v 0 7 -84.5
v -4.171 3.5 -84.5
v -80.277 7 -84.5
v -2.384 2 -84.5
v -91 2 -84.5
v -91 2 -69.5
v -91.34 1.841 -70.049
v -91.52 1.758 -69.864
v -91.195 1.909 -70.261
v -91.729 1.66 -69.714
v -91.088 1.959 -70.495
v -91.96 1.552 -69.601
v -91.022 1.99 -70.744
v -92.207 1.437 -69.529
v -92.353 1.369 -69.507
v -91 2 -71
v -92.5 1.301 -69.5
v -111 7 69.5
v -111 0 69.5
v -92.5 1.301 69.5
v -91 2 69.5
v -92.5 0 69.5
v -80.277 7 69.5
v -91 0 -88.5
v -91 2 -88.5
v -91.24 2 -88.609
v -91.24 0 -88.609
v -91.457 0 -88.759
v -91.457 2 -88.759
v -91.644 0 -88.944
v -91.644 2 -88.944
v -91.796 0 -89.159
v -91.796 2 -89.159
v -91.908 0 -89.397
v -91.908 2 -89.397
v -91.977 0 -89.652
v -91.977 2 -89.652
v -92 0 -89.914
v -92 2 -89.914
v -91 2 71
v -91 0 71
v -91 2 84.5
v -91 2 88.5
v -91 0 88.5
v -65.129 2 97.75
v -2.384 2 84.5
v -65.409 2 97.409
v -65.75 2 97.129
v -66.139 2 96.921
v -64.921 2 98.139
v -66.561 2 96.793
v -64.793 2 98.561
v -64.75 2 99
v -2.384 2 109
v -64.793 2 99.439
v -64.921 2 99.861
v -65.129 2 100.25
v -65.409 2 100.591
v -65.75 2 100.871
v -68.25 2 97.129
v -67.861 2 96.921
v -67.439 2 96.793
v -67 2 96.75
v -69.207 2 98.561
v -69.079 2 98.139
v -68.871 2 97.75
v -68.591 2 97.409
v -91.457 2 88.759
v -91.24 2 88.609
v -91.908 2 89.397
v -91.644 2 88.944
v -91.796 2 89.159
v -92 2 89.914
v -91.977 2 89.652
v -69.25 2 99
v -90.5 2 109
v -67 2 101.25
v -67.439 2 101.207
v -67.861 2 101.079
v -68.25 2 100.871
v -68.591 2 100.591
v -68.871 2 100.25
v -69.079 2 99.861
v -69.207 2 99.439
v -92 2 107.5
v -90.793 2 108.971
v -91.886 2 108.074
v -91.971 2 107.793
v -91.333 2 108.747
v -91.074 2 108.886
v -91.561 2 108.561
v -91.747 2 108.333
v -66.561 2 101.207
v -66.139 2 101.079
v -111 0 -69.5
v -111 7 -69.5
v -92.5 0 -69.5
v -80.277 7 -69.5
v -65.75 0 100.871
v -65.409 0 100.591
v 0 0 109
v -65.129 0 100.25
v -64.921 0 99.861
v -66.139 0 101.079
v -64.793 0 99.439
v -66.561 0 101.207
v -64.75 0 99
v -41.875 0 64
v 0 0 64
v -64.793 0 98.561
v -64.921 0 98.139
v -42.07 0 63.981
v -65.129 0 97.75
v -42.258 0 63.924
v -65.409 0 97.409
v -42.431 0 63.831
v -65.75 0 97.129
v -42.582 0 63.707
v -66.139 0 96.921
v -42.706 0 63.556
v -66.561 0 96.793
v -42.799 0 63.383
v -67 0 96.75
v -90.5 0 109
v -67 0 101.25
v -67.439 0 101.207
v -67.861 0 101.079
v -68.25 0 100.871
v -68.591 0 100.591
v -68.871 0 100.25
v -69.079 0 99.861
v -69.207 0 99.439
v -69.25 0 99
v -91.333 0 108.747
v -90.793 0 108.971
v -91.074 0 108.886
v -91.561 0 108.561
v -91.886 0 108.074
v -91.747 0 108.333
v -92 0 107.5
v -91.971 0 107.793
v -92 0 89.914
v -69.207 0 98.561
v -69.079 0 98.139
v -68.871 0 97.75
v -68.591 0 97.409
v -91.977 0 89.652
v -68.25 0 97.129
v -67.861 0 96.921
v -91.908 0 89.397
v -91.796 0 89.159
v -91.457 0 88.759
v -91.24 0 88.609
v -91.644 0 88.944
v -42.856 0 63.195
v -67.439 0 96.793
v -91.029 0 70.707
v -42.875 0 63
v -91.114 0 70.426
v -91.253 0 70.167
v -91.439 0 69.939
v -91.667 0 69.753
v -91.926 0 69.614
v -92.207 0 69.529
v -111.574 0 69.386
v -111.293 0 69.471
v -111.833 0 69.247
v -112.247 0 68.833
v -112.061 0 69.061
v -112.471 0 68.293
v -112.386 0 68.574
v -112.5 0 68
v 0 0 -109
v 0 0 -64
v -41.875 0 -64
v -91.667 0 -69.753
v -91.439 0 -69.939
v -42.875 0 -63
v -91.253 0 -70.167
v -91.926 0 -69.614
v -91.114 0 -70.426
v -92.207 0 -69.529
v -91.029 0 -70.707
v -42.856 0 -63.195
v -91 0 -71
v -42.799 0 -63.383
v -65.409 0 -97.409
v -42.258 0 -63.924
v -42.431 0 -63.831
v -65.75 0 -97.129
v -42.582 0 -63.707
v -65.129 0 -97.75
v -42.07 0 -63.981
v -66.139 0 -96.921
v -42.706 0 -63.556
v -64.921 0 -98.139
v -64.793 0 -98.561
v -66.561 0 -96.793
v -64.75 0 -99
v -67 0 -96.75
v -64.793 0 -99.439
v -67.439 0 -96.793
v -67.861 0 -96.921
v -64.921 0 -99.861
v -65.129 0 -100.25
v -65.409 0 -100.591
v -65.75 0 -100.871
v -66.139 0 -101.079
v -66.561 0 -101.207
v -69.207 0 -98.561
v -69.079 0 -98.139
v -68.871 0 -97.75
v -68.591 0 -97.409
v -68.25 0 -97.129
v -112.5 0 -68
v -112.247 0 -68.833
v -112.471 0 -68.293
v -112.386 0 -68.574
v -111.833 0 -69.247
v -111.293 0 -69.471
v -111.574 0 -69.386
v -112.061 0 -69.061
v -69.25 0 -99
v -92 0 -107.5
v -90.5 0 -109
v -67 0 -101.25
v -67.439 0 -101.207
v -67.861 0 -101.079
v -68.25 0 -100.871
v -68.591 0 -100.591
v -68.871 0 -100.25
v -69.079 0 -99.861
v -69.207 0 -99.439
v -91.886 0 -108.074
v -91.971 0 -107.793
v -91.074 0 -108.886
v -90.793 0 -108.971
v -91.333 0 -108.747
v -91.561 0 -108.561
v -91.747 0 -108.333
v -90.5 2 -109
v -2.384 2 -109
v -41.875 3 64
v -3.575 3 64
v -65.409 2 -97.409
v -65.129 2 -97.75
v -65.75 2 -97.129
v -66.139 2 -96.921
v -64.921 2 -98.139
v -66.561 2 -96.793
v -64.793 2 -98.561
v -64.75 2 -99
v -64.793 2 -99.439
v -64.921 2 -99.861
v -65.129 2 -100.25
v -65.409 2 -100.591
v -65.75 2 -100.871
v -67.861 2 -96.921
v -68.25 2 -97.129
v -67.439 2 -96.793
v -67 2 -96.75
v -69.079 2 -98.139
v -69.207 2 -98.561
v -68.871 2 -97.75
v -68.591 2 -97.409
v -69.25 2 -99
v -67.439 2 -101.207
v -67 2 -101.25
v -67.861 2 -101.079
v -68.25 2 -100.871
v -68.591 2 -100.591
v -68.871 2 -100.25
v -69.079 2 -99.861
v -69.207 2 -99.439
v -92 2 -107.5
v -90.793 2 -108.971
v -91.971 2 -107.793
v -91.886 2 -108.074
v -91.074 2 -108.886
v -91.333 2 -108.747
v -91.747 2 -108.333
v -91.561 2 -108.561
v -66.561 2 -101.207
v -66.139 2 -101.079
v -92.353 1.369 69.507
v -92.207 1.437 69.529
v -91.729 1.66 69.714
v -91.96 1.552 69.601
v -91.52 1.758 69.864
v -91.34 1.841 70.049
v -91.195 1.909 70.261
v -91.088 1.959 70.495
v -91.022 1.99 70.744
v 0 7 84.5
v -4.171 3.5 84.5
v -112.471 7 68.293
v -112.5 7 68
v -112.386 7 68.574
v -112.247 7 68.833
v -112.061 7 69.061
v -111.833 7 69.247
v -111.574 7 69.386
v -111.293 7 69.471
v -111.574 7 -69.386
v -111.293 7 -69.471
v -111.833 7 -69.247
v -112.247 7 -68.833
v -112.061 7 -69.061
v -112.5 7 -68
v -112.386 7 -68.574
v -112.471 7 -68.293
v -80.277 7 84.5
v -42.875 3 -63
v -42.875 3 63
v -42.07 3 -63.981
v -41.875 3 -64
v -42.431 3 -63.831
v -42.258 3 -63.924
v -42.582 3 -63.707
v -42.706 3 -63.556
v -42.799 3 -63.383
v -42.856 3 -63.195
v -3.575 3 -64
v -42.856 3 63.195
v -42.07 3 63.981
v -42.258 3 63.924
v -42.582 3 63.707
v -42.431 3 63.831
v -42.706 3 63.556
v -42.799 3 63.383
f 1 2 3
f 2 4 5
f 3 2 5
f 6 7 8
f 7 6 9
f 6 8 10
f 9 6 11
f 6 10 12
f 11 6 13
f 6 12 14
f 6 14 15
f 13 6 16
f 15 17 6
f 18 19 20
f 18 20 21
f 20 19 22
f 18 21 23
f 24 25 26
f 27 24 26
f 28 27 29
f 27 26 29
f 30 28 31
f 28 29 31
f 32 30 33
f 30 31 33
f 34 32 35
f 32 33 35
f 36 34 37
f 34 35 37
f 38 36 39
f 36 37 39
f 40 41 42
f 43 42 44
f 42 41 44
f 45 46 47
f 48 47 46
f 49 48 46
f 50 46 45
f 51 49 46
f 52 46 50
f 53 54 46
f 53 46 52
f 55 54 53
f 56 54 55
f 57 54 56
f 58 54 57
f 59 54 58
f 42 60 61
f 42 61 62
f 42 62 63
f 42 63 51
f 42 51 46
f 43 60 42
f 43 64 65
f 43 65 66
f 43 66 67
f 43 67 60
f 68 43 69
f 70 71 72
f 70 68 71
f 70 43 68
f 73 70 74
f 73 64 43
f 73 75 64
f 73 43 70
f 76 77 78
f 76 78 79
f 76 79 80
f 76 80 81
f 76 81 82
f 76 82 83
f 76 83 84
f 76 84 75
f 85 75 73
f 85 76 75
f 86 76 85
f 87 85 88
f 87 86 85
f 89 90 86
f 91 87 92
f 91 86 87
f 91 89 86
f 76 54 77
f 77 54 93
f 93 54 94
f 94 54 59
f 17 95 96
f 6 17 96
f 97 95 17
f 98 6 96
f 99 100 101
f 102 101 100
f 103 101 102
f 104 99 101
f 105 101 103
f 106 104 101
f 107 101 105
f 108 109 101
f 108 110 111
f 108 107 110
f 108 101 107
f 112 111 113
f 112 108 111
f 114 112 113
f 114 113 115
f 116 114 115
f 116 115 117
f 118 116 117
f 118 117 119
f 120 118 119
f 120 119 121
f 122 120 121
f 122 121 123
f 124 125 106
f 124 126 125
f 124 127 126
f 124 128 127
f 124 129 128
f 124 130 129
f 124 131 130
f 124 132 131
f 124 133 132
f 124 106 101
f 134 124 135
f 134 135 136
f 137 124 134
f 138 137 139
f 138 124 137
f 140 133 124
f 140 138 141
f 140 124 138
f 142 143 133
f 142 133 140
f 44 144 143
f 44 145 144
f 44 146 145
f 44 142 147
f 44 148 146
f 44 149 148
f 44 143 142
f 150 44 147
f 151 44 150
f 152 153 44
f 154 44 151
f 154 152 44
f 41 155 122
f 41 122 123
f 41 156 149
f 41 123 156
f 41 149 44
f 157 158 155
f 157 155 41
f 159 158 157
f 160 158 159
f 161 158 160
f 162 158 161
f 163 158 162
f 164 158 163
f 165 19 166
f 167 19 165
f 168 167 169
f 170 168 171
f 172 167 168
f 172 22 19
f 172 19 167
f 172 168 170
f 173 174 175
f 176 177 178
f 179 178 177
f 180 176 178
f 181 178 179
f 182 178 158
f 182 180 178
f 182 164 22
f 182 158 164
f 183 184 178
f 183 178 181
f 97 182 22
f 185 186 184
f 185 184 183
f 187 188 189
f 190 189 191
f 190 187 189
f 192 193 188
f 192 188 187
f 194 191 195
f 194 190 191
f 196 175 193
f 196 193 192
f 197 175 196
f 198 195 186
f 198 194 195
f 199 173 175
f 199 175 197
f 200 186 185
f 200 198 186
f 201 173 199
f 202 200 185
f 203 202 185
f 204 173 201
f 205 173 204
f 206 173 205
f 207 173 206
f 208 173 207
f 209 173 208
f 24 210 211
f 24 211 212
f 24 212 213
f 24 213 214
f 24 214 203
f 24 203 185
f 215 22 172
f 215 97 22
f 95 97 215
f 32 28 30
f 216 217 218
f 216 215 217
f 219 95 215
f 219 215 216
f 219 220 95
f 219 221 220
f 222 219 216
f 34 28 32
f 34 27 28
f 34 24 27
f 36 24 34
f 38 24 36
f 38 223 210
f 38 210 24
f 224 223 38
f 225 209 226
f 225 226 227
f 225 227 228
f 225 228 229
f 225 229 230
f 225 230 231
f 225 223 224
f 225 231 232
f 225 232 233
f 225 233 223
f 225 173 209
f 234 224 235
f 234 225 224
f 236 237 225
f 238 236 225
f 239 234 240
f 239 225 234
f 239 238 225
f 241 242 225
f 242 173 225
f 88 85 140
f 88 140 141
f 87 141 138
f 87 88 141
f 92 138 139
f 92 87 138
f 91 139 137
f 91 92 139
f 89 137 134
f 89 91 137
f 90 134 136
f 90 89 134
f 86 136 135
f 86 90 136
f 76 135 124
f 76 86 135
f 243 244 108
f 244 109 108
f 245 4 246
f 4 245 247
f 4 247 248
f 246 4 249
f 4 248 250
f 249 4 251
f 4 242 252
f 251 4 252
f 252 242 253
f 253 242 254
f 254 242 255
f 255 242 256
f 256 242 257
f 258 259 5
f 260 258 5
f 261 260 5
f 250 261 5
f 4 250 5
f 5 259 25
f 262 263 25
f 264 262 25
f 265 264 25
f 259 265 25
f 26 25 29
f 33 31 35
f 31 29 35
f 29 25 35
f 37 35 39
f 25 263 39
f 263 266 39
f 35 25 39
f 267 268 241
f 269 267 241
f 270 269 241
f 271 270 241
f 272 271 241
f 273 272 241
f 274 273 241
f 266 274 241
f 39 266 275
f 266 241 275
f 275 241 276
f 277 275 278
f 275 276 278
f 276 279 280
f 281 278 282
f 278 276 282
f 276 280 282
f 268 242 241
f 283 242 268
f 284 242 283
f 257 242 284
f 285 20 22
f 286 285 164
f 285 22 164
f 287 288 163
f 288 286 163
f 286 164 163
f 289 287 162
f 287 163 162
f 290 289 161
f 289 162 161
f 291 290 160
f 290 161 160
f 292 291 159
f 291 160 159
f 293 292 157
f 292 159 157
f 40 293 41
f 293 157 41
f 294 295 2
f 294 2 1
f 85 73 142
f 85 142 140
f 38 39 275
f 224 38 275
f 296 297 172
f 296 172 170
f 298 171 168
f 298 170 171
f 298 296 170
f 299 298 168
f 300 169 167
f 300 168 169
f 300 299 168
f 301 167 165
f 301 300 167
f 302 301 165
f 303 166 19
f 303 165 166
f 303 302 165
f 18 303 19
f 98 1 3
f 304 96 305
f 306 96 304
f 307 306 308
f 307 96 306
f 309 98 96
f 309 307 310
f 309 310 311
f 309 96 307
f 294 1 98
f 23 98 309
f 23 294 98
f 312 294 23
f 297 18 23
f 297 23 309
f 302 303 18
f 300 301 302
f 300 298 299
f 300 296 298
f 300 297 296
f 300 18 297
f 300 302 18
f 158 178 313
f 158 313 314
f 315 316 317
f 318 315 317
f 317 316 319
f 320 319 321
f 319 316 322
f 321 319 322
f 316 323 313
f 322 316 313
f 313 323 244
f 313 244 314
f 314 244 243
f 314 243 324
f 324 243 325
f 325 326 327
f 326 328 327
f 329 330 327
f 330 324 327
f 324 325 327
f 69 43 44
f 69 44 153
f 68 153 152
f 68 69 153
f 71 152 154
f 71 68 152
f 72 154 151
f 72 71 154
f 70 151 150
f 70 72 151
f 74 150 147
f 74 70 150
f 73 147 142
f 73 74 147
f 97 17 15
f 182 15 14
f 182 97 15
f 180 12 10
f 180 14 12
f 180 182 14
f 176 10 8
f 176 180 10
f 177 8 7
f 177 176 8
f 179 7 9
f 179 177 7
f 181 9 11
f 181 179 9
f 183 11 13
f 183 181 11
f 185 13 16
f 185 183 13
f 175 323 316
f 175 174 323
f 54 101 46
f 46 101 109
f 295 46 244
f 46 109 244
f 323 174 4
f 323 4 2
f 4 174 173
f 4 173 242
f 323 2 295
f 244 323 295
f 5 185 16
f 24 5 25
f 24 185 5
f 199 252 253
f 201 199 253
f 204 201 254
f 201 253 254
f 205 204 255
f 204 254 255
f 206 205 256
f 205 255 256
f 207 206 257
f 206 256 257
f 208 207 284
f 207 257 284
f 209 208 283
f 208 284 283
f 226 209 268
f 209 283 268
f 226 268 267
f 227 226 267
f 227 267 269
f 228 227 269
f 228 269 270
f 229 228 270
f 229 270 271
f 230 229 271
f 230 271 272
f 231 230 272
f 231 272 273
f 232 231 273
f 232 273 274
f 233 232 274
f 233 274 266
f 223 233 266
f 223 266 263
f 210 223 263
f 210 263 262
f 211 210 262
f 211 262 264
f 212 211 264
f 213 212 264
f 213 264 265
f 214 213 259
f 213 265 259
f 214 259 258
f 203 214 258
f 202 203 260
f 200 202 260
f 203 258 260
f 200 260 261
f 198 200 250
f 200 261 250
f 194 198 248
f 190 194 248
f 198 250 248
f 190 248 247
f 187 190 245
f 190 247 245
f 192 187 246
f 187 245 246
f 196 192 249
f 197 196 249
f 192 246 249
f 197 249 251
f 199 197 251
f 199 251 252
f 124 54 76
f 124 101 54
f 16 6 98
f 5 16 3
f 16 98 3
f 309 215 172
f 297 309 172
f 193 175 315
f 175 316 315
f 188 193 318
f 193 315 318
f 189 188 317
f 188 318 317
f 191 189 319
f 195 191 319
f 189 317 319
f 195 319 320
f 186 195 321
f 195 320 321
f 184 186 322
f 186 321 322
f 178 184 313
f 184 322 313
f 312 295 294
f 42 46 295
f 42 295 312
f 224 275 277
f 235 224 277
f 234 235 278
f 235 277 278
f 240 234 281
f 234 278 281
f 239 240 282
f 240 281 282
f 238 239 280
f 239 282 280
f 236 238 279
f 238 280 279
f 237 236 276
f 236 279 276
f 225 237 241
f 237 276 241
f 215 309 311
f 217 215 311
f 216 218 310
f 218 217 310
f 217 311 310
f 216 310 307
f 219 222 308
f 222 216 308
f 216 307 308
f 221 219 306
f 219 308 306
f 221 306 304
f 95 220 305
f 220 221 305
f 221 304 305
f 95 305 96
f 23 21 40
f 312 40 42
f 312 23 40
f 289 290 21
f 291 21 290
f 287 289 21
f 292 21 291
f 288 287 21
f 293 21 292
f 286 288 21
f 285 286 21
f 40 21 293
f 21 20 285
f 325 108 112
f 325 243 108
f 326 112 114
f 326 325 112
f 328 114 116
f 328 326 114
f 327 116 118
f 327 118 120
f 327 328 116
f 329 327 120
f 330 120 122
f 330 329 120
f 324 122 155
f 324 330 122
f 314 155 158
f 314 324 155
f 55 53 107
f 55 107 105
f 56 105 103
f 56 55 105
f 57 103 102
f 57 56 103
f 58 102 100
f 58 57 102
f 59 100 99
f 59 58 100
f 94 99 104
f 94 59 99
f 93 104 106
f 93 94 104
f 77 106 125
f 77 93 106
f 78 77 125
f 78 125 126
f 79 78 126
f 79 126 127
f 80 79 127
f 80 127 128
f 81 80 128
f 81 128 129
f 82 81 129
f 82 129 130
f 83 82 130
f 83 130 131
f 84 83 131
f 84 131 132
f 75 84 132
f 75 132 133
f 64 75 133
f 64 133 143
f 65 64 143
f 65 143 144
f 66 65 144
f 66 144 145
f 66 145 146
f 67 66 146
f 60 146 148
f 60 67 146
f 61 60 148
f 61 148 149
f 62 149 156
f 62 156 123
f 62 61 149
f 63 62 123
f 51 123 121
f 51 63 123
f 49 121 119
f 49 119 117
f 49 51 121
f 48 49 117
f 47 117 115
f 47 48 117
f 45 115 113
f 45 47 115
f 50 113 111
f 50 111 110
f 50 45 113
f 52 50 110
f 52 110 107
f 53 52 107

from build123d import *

# Parameters (mm, degrees)
SKIZZE2_W                       = 112.5
SKIZZE2_H                       = 109
AUFSATZ_LINEAR_AUSTRAGEN1_DEPTH = 2
SKIZZE3_W                       = 20.5
SKIZZE3_H                       = 20.5
SCHNITT_LINEAR_AUSTRAGEN1_DEPTH = 157.656471299
SKIZZE5_W                       = 91
SKIZZE5_H                       = 84.5
AUFSATZ_LINEAR_AUSTRAGEN2_DEPTH = 5
SKIZZE8_W                       = 21.5
SKIZZE8_H                       = 19
SCHNITT_LINEAR_AUSTRAGEN3_DEPTH = 157.723482606
SKIZZE9_W                       = 21.5
SKIZZE9_H                       = 69.5
AUFSATZ_LINEAR_AUSTRAGEN3_DEPTH = 5
FASE1_SIZE                      = 5
FASE1_SIZE2                     = 10.722534603
SKIZZE10_W                      = 85.75
SKIZZE10_H                      = 128
SCHNITT_LINEAR_AUSTRAGEN4_DEPTH = 3
VERRUNDUNG1_R                   = 1
DURCHGANGSLOCH_F_R_M41_D        = 4.5
DURCHGANGSLOCH_F_R_M41_DEPTH    = 6
VERRUNDUNG2_R                   = 1.5
SCHNITT_LINEAR_AUSTRAGEN7_DEPTH = 246.416482739


with BuildPart() as part:
    # Skizze2 → Aufsatz-Linear austragen1 (new body)
    with BuildSketch(Plane(origin=(0, 0, 0), x_dir=(1, 0, 0), z_dir=(0, 1, 0))):
        with Locations((-56.25, 54.5)):
            Rectangle(SKIZZE2_W, SKIZZE2_H)
    extrude(amount=AUFSATZ_LINEAR_AUSTRAGEN1_DEPTH)

    # Skizze3 → Schnitt-Linear austragen1 (cut, through all)
    with BuildSketch(Plane(origin=(0, 2, 0), x_dir=(1, 0, 0), z_dir=(0, 1, 0))):
        with Locations((-102.25, 98.75)):
            Rectangle(SKIZZE3_W, SKIZZE3_H)
    extrude(amount=-SCHNITT_LINEAR_AUSTRAGEN1_DEPTH, mode=Mode.SUBTRACT)

    # Skizze5 → Aufsatz-Linear austragen2 (add)
    with BuildSketch(Plane(origin=(0, 2, 0), x_dir=(1, 0, 0), z_dir=(0, 1, 0))):
        with Locations((-45.5, 42.25)):
            Rectangle(SKIZZE5_W, SKIZZE5_H)
    extrude(amount=AUFSATZ_LINEAR_AUSTRAGEN2_DEPTH)

    # Skizze8 → Schnitt-Linear austragen3 (cut, through all)
    with BuildSketch(Plane(origin=(0, 2, 0), x_dir=(1, 0, 0), z_dir=(0, 1, 0))):
        with Locations((-101.75, 79)):
            Rectangle(SKIZZE8_W, SKIZZE8_H)
    extrude(amount=-SCHNITT_LINEAR_AUSTRAGEN3_DEPTH, mode=Mode.SUBTRACT)

    # Skizze9 → Aufsatz-Linear austragen3 (add)
    with BuildSketch(Plane(origin=(0, 2, 0), x_dir=(1, 0, 0), z_dir=(0, 1, 0))):
        with Locations((-101.75, 34.75)):
            Rectangle(SKIZZE9_W, SKIZZE9_H)
    extrude(amount=AUFSATZ_LINEAR_AUSTRAGEN3_DEPTH)

    # Fase1
    fase1_edges = [part.edges().sort_by_distance(p)[0] for p in [
        (-91, 7, -77),
    ]]
    fase1_side = [part.faces().sort_by_distance(p)[0] for p in [
        (-91, 3.32300885, -77.672566372),
    ]]
    chamfer(fase1_edges, length=FASE1_SIZE, length2=FASE1_SIZE2, reference=fase1_side[0])

    # Skizze10 → Schnitt-Linear austragen4 (cut)
    with BuildSketch(Plane(origin=(0, 0, 0), x_dir=(1, 0, 0), z_dir=(0, 1, 0))):
        Rectangle(SKIZZE10_W, SKIZZE10_H)
    extrude(amount=SCHNITT_LINEAR_AUSTRAGEN4_DEPTH, mode=Mode.SUBTRACT)

    # Verrundung1
    verrundung1_edges = [part.edges().sort_by_distance(p)[0] for p in [
        (-42.875, 1.5, -64),
    ]]
    fillet(verrundung1_edges, radius=VERRUNDUNG1_R)

    # Durchgangsloch für M41
    with Locations(Plane(origin=(0, 0, 0), x_dir=(-1, 0, 0), z_dir=(0, -1, 0))):
        with Locations((67, 99)):
            Hole(DURCHGANGSLOCH_F_R_M41_D / 2, depth=DURCHGANGSLOCH_F_R_M41_DEPTH)

    # Verrundung2
    # the kernel refuses this fillet: 1.5 mm, written as the material it adds along each edge
    with BuildSketch(Plane(origin=(-91, 0, -69.5), x_dir=(-1, 0, 0), z_dir=(0, 1, 0))) as verrundung2_piece_1_section:
        with BuildLine():
            CenterArc((VERRUNDUNG2_R, -VERRUNDUNG2_R), VERRUNDUNG2_R, 90, 90)
            Line((0, -VERRUNDUNG2_R), (0, 0))
            Line((0, 0), (VERRUNDUNG2_R, 0))
        make_face()
    verrundung2_piece_1 = extrude(amount=5.75, mode=Mode.PRIVATE)
    verrundung2_piece_1 = split(verrundung2_piece_1, bisect_by=Plane(origin=(-91.766044443, 1.64278761, -69.5), z_dir=(0.4226182617406971, -0.906307787036651, 0)), keep=Keep.TOP, mode=Mode.PRIVATE)
    add(verrundung2_piece_1)
    # the kernel refuses this fillet: 1.5 mm, written as the material it takes off along each edge
    with BuildSketch(Plane(origin=(-92, 5.535533906, -88.5), x_dir=(0, 0, -1), z_dir=(0, -1, 0))) as verrundung2_2_piece_1:
        with BuildLine():
            CenterArc((1.414213562, 1.5), VERRUNDUNG2_R, 199.471220634, 70.528779366)
            Line((0, 1), (0, 0))
            Line((0, 0), (1.414213562, 0))
        make_face()
    extrude(amount=9.071067812, mode=Mode.SUBTRACT)
    with BuildSketch(Plane(origin=(-112.5, 10.75, -69.5), x_dir=(1, 0, 0), z_dir=(0, -1, 0))) as verrundung2_2_piece_2:
        with BuildLine():
            CenterArc((VERRUNDUNG2_R, VERRUNDUNG2_R), VERRUNDUNG2_R, 180, 90)
            Line((0, VERRUNDUNG2_R), (0, 0))
            Line((0, 0), (VERRUNDUNG2_R, 0))
        make_face()
    extrude(amount=14.5, mode=Mode.SUBTRACT)
    with BuildSketch(Plane(origin=(-92, 5.75, -109), x_dir=(1, 0, 0), z_dir=(0, -1, 0))) as verrundung2_2_piece_3:
        with BuildLine():
            CenterArc((VERRUNDUNG2_R, VERRUNDUNG2_R), VERRUNDUNG2_R, 180, 90)
            Line((0, VERRUNDUNG2_R), (0, 0))
            Line((0, 0), (VERRUNDUNG2_R, 0))
        make_face()
    extrude(amount=9.5, mode=Mode.SUBTRACT)

    # Spiegeln1: part across face


with BuildPart() as part_1:
    add(part.part)
    add(part.part.mirror(Plane(origin=(-63.046065737, 3.890438247, 0), x_dir=(1, 0, 0), z_dir=(0, 0, 1))))

    # Spiegeln2: part across plane


with BuildPart() as part_2:
    add(part_1.part)
    add(part_1.part.mirror(Plane(origin=(0, 2, 0), x_dir=(0, 0, 1), z_dir=(-1, 0, 0))))

    # Skizze15 → Schnitt-Linear austragen7 (cut, through all)
    with BuildSketch(Plane(origin=(0, 0, -109), x_dir=(-1, 0, 0), z_dir=(0, 0, -1))):
        Polygon((0, 0), (4.171137574, 3.5), (0, 7), (-112.5, 7), (-112.5, 0), align=None)
    extrude(amount=-SCHNITT_LINEAR_AUSTRAGEN7_DEPTH, mode=Mode.SUBTRACT)


solid = part_2.part
